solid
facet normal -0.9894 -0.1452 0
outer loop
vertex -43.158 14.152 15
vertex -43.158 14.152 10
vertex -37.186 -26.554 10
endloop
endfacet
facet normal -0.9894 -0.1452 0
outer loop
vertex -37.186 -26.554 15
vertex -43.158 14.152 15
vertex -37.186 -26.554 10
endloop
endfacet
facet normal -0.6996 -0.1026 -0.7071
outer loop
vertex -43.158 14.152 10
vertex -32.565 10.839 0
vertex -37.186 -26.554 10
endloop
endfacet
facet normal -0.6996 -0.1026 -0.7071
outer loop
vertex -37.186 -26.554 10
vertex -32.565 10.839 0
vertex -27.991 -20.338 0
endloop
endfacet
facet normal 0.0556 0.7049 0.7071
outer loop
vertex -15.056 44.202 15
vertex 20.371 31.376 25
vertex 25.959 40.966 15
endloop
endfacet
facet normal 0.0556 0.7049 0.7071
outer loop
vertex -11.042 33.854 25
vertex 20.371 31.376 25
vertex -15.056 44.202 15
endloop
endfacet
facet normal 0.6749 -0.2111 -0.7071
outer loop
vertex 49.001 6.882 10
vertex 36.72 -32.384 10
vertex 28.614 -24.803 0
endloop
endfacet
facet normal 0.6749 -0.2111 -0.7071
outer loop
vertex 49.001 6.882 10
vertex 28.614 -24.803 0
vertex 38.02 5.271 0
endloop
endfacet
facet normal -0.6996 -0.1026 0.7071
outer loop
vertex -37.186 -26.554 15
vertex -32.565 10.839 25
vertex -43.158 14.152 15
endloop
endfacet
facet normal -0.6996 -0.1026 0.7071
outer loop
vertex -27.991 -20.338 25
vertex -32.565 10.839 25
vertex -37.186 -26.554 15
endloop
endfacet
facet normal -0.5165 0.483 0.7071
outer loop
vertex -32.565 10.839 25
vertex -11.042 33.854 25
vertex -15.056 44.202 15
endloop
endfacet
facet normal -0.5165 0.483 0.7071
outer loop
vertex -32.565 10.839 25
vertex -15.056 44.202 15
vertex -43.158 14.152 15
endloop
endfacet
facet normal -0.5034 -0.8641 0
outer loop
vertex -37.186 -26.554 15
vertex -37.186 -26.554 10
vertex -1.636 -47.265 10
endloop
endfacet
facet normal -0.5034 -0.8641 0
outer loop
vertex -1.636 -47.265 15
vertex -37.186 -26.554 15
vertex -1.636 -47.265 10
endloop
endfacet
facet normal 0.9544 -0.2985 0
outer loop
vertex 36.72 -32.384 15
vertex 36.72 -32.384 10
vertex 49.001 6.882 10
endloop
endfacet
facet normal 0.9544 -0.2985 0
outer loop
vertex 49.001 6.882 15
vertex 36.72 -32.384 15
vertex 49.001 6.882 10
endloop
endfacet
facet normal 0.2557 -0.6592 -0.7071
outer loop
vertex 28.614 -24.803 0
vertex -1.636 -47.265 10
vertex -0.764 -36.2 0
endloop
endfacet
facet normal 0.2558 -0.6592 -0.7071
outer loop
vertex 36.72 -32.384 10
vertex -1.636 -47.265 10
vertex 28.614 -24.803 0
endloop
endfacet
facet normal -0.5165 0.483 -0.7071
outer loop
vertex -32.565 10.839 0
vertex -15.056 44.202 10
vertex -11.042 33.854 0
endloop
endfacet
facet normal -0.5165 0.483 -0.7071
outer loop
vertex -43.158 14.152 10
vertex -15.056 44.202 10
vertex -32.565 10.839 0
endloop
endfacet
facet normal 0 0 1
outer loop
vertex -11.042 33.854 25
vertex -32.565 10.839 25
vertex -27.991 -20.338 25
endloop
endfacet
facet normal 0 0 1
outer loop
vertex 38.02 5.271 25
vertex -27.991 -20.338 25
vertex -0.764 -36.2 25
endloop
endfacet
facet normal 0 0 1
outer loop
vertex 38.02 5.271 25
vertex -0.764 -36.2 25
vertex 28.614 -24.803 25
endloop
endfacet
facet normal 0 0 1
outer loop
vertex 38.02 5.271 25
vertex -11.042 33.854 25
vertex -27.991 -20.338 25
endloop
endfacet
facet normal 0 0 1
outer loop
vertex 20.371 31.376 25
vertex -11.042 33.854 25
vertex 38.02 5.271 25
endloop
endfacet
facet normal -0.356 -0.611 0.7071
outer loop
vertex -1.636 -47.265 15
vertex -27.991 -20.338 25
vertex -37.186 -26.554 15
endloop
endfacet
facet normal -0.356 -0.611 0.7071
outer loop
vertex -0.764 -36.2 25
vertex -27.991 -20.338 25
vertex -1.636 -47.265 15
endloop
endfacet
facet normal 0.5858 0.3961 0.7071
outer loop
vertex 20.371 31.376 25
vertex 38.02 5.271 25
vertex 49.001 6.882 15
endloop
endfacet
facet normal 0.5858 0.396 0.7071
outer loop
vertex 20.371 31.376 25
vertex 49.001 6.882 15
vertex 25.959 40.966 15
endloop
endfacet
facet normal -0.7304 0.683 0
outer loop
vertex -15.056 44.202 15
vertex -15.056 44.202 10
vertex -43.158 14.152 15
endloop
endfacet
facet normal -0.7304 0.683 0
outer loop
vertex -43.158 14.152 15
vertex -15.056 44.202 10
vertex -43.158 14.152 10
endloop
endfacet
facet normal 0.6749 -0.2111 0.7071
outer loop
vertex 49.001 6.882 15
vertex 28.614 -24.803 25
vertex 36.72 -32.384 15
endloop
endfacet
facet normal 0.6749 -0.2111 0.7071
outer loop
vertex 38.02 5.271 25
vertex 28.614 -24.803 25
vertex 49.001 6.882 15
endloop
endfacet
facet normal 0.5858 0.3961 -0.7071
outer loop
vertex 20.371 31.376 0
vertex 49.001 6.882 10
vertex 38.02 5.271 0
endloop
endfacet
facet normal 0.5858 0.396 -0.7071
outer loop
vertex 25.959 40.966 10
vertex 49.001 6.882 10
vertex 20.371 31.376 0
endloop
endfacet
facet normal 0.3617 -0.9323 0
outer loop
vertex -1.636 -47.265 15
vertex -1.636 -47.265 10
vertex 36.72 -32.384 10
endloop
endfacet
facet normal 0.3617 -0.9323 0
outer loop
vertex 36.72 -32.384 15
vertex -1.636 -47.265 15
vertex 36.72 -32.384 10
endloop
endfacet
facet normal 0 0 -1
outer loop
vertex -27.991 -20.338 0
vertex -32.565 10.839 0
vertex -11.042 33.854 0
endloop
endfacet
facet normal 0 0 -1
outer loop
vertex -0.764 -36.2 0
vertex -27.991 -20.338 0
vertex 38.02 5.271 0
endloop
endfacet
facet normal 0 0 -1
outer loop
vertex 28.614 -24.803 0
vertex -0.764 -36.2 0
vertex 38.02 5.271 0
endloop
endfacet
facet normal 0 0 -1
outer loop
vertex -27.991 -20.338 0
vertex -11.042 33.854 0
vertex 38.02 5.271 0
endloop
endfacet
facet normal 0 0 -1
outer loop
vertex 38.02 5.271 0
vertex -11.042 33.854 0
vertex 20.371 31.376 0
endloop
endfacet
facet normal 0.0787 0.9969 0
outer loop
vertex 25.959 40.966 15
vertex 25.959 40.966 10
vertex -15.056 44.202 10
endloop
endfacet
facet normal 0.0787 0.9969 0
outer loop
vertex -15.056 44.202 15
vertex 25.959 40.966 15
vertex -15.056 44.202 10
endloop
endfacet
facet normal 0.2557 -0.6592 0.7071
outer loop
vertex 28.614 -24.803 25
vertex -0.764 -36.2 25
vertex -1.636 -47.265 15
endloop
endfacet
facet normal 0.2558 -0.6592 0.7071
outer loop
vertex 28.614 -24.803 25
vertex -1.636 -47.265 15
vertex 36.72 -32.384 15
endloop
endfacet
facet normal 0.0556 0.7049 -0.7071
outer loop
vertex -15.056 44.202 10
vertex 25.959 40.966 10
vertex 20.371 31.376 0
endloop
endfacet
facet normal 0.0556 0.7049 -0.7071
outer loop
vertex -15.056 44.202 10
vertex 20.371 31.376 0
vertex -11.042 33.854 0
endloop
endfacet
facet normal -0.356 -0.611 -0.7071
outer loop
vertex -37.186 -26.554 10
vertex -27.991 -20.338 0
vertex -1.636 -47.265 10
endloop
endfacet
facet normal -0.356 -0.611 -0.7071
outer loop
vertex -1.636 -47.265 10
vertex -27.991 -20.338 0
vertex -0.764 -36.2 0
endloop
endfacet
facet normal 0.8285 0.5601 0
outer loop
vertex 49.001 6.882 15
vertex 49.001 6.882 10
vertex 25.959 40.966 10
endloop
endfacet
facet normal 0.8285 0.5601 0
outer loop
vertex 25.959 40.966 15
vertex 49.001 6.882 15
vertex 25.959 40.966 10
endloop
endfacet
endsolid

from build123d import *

# Parameters (mm, degrees)
F1_DEPTH = 25
F2_SIZE  = 10
F3_SIZE  = 10


with BuildPart() as f1:
    # F0 (on Top) → F1 (new body)
    with BuildSketch(Plane.XY):
        Polygon((-37.185604, -26.554091), (-1.63635, -47.264697), (36.720452, -32.384023), (49.001347, 6.882481), (25.958571, 40.966337), (-15.056196, 44.201705), (-43.157998, 14.152288), align=None)
    extrude(amount=F1_DEPTH)

    # F2
    f2_edges = [f1.edges().sort_by_distance(p)[0] for p in [
        (-19.410977, -36.909394, 25),
        (5.451187, 42.584021, 25),
        (-29.107097, 29.176996, 25),
        (-40.171801, -6.200901, 25),
        (17.542051, -39.82436, 25),
        (42.8609, -12.750771, 25),
        (37.479959, 23.924409, 25),
    ]]
    chamfer(f2_edges, length=F2_SIZE)

    # F3
    f3_edges = [f1.edges().sort_by_distance(p)[0] for p in [
        (-29.107097, 29.176996, 0),
        (5.451187, 42.584021, 0),
        (-40.171801, -6.200901, 0),
        (-19.410977, -36.909394, 0),
        (17.542051, -39.82436, 0),
        (42.8609, -12.750771, 0),
        (37.479959, 23.924409, 0),
    ]]
    chamfer(f3_edges, length=F3_SIZE)


solid = f1.part
